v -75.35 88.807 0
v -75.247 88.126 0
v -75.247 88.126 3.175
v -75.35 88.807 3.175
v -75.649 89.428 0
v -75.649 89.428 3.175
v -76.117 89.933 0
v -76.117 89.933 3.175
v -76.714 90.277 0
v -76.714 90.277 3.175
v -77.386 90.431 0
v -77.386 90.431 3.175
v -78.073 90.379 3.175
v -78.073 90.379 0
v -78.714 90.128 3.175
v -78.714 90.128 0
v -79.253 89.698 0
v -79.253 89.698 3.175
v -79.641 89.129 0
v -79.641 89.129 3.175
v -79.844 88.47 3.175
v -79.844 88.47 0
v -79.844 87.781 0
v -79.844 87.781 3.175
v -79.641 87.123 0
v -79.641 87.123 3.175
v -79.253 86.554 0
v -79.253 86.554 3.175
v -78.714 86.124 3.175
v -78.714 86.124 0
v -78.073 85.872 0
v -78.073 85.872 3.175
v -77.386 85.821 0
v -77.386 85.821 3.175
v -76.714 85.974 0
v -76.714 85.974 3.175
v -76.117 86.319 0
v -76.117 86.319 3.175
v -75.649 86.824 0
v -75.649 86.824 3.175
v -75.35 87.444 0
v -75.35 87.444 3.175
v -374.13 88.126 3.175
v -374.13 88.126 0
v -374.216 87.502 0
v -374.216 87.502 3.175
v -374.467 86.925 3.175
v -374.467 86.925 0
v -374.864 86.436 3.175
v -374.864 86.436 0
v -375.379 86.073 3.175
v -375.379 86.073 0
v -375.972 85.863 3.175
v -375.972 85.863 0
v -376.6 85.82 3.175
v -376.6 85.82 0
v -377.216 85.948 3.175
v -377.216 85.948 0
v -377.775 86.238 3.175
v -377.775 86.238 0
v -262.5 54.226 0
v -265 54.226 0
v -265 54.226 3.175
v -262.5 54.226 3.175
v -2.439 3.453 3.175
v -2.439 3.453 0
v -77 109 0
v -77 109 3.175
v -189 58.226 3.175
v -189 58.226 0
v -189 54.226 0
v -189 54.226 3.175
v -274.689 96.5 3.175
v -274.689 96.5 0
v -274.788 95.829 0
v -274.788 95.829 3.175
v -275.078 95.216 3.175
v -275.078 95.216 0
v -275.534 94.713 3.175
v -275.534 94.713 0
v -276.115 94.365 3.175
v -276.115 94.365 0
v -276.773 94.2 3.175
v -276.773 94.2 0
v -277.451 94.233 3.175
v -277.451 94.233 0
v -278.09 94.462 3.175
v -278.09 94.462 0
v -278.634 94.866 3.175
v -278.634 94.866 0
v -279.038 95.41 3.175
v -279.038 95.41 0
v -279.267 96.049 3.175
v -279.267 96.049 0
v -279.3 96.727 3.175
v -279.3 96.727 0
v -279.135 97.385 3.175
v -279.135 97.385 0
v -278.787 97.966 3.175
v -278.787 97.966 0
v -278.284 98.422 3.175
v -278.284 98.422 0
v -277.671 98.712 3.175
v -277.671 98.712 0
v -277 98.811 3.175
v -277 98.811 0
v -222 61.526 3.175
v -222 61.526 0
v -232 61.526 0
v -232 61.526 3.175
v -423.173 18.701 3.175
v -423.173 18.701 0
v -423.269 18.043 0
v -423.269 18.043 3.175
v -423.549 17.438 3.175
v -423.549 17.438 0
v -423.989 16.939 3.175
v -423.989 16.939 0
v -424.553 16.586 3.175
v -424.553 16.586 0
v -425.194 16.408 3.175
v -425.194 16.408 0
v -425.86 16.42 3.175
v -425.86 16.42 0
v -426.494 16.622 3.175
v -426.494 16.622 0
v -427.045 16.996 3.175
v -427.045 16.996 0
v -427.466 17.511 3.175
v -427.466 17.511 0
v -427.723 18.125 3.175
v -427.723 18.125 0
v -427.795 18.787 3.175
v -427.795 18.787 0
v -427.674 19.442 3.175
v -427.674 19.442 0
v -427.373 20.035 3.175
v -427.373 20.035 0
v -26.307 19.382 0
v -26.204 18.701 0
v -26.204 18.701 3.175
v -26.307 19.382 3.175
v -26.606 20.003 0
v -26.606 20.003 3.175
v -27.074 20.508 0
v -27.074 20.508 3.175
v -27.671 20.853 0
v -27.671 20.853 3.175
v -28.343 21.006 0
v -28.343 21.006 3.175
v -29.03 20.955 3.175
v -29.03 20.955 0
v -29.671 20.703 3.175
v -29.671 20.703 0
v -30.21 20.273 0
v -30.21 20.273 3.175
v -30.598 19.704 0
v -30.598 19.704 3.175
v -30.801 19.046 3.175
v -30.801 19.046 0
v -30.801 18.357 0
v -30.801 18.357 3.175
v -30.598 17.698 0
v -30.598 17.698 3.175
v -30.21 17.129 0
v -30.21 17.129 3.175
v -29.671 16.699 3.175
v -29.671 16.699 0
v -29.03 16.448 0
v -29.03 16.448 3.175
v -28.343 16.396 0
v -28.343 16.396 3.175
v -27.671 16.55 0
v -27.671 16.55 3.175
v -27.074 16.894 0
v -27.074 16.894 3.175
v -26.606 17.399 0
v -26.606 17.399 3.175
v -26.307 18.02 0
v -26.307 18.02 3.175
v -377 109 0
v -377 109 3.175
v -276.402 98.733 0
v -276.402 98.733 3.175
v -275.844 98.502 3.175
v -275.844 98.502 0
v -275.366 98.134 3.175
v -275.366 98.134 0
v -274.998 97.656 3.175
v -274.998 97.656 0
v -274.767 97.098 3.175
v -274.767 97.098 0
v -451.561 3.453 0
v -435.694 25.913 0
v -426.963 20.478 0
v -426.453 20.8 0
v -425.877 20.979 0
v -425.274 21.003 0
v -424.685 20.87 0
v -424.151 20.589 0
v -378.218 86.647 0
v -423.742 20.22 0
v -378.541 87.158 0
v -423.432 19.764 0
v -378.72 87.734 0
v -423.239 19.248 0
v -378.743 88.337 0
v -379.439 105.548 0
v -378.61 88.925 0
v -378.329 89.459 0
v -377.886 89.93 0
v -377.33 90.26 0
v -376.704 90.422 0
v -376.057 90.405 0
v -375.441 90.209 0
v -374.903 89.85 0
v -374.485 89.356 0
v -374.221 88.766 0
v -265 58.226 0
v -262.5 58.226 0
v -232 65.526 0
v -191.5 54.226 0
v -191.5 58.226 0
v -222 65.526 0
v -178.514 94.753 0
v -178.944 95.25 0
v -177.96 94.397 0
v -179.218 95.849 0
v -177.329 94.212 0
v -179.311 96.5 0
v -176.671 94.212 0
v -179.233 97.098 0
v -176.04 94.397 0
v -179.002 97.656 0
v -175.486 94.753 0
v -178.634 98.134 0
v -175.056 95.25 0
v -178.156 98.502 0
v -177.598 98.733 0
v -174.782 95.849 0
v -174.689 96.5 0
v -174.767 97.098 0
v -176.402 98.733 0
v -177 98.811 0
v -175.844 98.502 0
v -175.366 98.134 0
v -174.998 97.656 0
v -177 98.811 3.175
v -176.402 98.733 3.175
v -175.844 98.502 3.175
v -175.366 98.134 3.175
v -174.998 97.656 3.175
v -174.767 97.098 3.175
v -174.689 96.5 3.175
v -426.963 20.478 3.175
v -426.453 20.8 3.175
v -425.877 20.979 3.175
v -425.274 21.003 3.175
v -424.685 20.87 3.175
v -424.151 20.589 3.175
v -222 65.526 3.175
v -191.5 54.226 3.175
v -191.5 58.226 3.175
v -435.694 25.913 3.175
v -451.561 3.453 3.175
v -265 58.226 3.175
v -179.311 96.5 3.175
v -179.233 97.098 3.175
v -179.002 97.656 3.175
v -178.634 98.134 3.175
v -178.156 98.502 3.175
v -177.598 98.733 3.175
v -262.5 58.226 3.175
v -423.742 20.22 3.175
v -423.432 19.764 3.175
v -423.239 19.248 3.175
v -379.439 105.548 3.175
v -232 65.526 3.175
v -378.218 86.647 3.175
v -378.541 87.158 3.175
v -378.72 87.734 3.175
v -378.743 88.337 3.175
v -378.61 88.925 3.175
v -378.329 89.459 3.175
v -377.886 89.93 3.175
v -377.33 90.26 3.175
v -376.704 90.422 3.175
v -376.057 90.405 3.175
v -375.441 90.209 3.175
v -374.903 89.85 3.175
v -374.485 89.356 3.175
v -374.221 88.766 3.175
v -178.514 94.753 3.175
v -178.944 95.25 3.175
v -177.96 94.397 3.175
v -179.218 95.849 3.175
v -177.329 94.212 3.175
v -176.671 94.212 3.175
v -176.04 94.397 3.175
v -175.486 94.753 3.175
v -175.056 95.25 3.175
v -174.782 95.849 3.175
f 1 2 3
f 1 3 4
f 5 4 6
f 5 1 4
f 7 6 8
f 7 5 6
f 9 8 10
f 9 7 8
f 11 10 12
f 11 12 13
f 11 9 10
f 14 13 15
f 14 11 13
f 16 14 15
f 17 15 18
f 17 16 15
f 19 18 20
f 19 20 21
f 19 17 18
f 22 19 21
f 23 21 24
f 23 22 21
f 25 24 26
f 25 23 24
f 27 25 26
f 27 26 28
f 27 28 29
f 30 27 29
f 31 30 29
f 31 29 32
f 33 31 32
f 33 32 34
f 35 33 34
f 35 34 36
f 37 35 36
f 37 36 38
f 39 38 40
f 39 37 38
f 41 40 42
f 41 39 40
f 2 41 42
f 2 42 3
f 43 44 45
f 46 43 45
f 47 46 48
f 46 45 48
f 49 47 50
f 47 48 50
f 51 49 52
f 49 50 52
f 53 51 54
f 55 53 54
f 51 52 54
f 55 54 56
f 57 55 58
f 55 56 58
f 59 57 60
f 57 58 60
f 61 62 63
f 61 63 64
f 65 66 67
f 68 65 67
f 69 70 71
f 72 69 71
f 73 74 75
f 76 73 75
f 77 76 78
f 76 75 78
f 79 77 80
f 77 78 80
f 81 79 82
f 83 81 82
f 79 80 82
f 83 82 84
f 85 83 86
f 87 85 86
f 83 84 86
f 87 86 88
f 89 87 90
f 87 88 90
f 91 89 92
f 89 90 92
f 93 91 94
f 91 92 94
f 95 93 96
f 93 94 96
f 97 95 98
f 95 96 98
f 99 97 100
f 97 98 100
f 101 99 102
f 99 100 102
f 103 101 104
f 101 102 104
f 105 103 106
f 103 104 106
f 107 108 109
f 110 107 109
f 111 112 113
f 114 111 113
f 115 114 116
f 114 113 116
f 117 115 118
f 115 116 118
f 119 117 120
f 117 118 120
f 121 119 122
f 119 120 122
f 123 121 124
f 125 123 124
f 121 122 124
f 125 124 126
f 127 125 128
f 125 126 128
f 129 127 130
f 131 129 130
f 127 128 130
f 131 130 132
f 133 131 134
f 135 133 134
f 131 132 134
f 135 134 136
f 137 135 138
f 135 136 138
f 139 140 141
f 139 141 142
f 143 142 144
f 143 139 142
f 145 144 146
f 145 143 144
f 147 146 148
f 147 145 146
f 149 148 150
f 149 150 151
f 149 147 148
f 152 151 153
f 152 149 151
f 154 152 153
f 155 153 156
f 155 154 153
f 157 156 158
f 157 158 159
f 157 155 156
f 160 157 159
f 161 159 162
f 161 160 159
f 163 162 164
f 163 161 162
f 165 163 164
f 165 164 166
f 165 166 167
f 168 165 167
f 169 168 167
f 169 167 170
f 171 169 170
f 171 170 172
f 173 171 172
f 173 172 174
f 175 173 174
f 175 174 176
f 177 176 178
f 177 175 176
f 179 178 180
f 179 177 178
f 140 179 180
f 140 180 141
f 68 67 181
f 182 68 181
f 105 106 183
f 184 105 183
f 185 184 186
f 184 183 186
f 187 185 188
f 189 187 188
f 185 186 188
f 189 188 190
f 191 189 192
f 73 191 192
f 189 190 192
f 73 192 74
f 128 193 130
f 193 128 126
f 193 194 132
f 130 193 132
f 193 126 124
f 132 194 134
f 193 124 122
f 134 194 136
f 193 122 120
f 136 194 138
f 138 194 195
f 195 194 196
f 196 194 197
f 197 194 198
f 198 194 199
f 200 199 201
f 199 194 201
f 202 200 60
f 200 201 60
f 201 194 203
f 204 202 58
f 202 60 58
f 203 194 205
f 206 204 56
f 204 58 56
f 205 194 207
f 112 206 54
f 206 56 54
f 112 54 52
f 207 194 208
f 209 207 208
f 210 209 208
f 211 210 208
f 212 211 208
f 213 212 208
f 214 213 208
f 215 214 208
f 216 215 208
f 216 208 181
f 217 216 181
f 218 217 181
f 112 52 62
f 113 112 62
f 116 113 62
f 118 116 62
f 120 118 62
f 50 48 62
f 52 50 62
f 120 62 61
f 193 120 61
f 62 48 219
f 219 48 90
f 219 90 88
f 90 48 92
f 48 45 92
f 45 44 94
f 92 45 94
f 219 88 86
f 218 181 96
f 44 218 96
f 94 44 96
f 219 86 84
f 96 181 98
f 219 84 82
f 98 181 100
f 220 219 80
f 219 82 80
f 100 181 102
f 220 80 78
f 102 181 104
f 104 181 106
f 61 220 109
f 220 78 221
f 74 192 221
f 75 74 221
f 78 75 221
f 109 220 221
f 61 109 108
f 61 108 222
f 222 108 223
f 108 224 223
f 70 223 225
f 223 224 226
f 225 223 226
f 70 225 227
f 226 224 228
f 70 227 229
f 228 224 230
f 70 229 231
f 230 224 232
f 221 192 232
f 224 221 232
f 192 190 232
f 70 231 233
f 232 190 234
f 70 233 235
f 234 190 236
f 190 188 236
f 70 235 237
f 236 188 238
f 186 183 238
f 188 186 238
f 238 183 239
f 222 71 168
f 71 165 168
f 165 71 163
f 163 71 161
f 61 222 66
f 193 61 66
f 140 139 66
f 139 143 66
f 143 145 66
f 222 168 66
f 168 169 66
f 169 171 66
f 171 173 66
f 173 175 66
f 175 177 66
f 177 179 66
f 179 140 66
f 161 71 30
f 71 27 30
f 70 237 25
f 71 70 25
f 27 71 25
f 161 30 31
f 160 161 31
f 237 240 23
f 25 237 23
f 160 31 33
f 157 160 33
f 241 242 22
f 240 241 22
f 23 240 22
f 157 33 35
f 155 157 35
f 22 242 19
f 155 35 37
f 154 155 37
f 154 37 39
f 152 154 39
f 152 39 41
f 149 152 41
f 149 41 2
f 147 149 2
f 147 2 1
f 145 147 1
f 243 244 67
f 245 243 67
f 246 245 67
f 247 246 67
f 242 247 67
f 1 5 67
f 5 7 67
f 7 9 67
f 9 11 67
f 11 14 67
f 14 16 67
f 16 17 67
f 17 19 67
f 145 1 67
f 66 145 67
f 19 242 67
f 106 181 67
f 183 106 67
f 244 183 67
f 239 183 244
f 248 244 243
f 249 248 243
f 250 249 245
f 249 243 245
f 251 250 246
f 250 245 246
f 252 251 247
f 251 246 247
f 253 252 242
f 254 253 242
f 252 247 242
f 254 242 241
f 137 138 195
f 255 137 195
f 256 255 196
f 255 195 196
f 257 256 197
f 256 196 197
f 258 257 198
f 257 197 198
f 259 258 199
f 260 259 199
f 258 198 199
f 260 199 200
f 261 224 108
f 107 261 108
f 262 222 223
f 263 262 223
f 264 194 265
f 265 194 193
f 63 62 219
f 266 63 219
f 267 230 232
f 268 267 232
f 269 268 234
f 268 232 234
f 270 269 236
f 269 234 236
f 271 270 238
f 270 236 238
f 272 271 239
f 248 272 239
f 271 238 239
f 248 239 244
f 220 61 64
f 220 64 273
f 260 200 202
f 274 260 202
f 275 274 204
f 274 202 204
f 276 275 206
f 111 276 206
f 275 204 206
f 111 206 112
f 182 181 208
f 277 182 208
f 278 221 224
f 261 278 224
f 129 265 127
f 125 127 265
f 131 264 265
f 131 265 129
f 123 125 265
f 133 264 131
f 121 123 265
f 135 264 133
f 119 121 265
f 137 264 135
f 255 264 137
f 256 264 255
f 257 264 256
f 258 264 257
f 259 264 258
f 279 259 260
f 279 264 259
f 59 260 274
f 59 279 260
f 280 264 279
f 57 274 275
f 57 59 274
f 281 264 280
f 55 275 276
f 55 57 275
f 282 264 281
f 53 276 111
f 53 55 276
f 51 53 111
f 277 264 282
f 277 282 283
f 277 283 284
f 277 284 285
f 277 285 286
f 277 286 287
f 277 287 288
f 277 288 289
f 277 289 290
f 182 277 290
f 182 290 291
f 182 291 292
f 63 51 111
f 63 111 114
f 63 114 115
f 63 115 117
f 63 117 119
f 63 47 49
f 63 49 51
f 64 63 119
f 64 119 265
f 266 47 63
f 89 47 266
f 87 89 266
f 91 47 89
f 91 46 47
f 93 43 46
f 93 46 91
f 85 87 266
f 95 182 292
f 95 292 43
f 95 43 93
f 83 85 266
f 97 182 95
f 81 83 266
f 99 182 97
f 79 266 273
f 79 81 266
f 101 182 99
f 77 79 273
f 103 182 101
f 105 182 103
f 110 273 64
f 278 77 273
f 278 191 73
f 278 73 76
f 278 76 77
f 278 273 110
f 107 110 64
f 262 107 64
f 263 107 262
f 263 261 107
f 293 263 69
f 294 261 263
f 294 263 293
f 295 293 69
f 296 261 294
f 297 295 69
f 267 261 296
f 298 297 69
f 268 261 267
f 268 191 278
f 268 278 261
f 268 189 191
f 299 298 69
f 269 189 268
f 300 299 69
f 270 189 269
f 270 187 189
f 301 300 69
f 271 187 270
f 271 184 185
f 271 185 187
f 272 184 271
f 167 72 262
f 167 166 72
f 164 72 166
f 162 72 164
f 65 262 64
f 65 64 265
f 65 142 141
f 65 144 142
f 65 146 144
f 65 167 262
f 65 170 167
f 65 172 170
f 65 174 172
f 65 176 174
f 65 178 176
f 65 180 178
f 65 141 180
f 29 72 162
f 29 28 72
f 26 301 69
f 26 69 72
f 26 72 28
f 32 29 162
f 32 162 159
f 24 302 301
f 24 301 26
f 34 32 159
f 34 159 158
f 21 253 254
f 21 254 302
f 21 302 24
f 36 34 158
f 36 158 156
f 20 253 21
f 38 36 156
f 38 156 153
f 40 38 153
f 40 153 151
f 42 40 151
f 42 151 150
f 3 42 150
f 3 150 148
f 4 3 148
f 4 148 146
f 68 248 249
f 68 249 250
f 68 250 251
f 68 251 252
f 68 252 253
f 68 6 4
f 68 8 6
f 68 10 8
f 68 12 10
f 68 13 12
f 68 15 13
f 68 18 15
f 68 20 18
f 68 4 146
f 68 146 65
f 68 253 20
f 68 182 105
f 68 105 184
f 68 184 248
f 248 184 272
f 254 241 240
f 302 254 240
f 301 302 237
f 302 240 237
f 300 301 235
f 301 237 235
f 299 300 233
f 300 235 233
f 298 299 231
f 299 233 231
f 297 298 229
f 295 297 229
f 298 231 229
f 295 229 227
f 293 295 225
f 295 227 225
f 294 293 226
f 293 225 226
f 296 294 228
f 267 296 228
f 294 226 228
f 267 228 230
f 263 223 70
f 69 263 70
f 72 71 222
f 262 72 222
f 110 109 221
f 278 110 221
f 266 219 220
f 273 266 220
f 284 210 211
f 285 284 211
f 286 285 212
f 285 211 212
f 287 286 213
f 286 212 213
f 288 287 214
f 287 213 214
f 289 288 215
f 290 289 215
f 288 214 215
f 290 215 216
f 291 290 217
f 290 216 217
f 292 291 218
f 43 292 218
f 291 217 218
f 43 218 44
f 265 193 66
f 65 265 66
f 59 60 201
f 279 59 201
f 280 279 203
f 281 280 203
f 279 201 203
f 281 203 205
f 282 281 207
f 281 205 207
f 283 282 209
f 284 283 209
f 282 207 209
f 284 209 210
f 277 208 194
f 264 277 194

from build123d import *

# Parameters (mm, degrees)
F0_W     = 2.5
F0_H     = 4
F0_R     = 2.3114
F1_DEPTH = 3.175


with BuildPart() as f1:
    # F0 (on Top) → F1 (new body)
    with BuildSketch(Plane.XY):
        with BuildLine():
            Line((-451.5609132883, 3.4527331373), (-420.9521720122, 3.4527331373))
            Line((-420.9521720122, 3.4527331373), (-359.0199119076, 91.1230753634))
            Line((-359.0199119076, 91.1230753634), (-379.4389155629, 105.5475091382))
            Line((-379.4389155629, 105.5475091382), (-386.6511324503, 95.3380073106))
            Line((-386.6511324503, 95.3380073106), (-378.3294900246, 89.4594158723))
            ThreePointArc((-378.3294900246, 89.4594158723), (-375.7419979554, 90.3287620732), (-374.1302306227, 88.1257904232))
            ThreePointArc((-374.1302306227, 88.1257904232), (-375.3786094336, 86.0733392273), (-377.7752560717, 86.2379310212))
            Line((-377.7752560717, 86.2379310212), (-424.151080008, 20.5890373971))
            ThreePointArc((-424.151080008, 20.5890373971), (-423.4322542612, 19.7641991843), (-423.1733054571, 18.7011779952))
            ThreePointArc((-423.1733054571, 18.7011779952), (-426.1843381244, 16.4982063451), (-427.3725648591, 20.0348034442))
            Line((-427.3725648591, 20.0348034442), (-435.6942072848, 25.9133948826))
            Line((-435.6942072848, 25.9133948826), (-451.5609132883, 3.4527331373))
        make_face()
        Polygon((-359.0199119076, 91.1230753634), (-420.9521720122, 3.4527331373), (-227, 3.4527331373), (-227, 56.2263665687), (-227, 61.5263665687), (-232, 61.5263665687), (-232, 65.5263665687), (-227, 65.5263665687), (-227, 77.2140920162), (-227, 109), (-277, 109), (-377, 109), (-379.4389155629, 105.5475091382), align=None)
        with Locations((-263.75, 56.2263665687)):
            Rectangle(F0_W, F0_H, mode=Mode.SUBTRACT)
        with BuildLine():
            ThreePointArc((-274.6886, 96.5), (-278.634406614, 94.865593386), (-277, 98.8114))
            ThreePointArc((-277, 98.8114), (-275.365593386, 98.134406614), (-274.6886, 96.5))
        make_face(mode=Mode.SUBTRACT)
        Polygon((-227, 56.2263665687), (-227, 3.4527331373), (-2.4390867117, 3.4527331373), (-77, 109), (-177, 109), (-227, 109), (-227, 77.2140920162), (-227, 65.5263665687), (-222, 65.5263665687), (-222, 61.5263665687), (-227, 61.5263665687), align=None)
        with Locations((-28.5152945429, 18.7011779952)):
            Circle(F0_R, mode=Mode.SUBTRACT)
        Polygon((-191.5, 54.2263665687), (-191.5, 56.2263665687), (-191.5, 58.2263665687), (-189, 58.2263665687), (-189, 54.2263665687), align=None, mode=Mode.SUBTRACT)
        with Locations((-77.5583693773, 88.1257904232)):
            Circle(F0_R, mode=Mode.SUBTRACT)
        with BuildLine():
            ThreePointArc((-174.6886, 96.5), (-177, 94.1886), (-179.3114, 96.5))
            ThreePointArc((-179.3114, 96.5), (-178.634406614, 98.134406614), (-177, 98.8114))
            ThreePointArc((-177, 98.8114), (-175.365593386, 98.134406614), (-174.6886, 96.5))
        make_face(mode=Mode.SUBTRACT)
        with BuildLine():
            Line((-415.5, 54.5), (-435.6942072848, 25.9133948826))
            Line((-435.6942072848, 25.9133948826), (-427.3725648591, 20.0348034442))
            ThreePointArc((-427.3725648591, 20.0348034442), (-425.8766080436, 20.9791117788), (-424.151080008, 20.5890373971))
            Line((-424.151080008, 20.5890373971), (-377.7752560717, 86.2379310212))
            ThreePointArc((-377.7752560717, 86.2379310212), (-378.7195644063, 87.7338878367), (-378.3294900246, 89.4594158723))
            Line((-378.3294900246, 89.4594158723), (-386.6511324503, 95.3380073106))
            Line((-386.6511324503, 95.3380073106), (-415.5, 54.5))
        make_face()
    extrude(amount=F1_DEPTH)


solid = f1.part
